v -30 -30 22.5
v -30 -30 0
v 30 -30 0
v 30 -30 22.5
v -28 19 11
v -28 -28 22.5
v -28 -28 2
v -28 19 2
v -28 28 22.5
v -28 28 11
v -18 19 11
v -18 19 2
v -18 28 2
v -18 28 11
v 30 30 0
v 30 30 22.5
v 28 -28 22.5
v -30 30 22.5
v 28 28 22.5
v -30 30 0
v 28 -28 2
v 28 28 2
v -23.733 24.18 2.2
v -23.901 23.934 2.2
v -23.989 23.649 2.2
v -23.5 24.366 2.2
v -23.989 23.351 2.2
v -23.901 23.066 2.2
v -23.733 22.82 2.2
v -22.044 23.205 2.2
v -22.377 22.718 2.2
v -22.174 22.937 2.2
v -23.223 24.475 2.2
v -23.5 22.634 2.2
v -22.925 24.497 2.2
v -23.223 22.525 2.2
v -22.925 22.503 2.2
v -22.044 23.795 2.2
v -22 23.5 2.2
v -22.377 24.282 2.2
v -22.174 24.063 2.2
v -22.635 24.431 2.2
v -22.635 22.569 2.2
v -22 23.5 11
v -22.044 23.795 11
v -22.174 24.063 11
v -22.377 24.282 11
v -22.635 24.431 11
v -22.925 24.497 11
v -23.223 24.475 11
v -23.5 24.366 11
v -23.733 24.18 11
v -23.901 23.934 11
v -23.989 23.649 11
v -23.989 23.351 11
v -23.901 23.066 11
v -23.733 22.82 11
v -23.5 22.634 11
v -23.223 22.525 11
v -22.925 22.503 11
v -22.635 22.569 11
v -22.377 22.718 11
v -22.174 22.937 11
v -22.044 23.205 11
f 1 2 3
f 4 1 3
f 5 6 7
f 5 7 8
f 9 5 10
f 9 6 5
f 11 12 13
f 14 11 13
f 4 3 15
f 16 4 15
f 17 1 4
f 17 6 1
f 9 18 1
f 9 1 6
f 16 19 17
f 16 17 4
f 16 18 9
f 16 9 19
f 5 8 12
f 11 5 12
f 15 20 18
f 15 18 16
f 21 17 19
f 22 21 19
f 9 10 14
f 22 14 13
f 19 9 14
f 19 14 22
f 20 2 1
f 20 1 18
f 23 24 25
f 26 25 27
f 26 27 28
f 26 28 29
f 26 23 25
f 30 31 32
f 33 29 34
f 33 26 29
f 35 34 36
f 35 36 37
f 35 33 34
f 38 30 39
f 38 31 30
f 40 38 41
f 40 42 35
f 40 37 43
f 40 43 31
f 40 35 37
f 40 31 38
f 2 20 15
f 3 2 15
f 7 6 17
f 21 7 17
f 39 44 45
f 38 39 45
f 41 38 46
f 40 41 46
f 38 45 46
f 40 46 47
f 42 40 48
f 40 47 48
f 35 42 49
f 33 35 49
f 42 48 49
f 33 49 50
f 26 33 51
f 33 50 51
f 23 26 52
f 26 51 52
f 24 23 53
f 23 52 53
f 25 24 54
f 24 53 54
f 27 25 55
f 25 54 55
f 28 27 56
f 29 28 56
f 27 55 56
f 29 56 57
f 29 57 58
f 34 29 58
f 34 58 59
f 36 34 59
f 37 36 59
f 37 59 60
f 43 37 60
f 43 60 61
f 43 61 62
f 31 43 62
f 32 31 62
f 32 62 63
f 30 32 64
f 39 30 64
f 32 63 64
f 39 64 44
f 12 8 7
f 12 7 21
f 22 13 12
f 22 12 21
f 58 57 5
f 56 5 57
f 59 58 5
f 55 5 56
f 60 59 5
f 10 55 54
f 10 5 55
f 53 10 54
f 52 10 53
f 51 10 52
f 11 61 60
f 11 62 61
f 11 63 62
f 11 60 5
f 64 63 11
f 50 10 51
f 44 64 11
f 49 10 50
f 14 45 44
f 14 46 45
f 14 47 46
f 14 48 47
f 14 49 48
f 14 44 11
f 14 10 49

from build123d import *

# Parameters (mm, degrees)
SKETCH_1_W          = 60
SKETCH_1_H          = 60
EXTRUDE_300_DEPTH   = 22.5
SKETCH_2_W          = 56
SKETCH_2_H          = 56
CUT_EXTRUDE_1_DEPTH = 20.5
SKETCH_4_W          = 10
SKETCH_4_H          = 9
EXTRUDE_2_DEPTH     = 9
SKETCH_5_R          = 1
CUT_EXTRUDE_2_DEPTH = 8.8


with BuildPart() as part:
    # Эскиз1 → Extrude 300 (new body)
    with BuildSketch(Plane.XY):
        Rectangle(SKETCH_1_W, SKETCH_1_H)
    extrude(amount=EXTRUDE_300_DEPTH)

    # Эскиз2 → Вырез-Вытянуть1 (cut)
    with BuildSketch(Plane.XY.offset(22.5)):
        Rectangle(SKETCH_2_W, SKETCH_2_H)
    extrude(amount=-CUT_EXTRUDE_1_DEPTH, mode=Mode.SUBTRACT)

    # Эскиз4 → Бобышка-Вытянуть2 (add)
    with BuildSketch(Plane.XY.offset(2)):
        with Locations((-23, 23.5)):
            Rectangle(SKETCH_4_W, SKETCH_4_H)
    extrude(amount=EXTRUDE_2_DEPTH)

    # Эскиз5 → Вырез-Вытянуть2 (cut)
    with BuildSketch(Plane.XY.offset(11)):
        with Locations((-23, 23.5)):
            Circle(SKETCH_5_R)
    extrude(amount=-CUT_EXTRUDE_2_DEPTH, mode=Mode.SUBTRACT)


solid = part.part
